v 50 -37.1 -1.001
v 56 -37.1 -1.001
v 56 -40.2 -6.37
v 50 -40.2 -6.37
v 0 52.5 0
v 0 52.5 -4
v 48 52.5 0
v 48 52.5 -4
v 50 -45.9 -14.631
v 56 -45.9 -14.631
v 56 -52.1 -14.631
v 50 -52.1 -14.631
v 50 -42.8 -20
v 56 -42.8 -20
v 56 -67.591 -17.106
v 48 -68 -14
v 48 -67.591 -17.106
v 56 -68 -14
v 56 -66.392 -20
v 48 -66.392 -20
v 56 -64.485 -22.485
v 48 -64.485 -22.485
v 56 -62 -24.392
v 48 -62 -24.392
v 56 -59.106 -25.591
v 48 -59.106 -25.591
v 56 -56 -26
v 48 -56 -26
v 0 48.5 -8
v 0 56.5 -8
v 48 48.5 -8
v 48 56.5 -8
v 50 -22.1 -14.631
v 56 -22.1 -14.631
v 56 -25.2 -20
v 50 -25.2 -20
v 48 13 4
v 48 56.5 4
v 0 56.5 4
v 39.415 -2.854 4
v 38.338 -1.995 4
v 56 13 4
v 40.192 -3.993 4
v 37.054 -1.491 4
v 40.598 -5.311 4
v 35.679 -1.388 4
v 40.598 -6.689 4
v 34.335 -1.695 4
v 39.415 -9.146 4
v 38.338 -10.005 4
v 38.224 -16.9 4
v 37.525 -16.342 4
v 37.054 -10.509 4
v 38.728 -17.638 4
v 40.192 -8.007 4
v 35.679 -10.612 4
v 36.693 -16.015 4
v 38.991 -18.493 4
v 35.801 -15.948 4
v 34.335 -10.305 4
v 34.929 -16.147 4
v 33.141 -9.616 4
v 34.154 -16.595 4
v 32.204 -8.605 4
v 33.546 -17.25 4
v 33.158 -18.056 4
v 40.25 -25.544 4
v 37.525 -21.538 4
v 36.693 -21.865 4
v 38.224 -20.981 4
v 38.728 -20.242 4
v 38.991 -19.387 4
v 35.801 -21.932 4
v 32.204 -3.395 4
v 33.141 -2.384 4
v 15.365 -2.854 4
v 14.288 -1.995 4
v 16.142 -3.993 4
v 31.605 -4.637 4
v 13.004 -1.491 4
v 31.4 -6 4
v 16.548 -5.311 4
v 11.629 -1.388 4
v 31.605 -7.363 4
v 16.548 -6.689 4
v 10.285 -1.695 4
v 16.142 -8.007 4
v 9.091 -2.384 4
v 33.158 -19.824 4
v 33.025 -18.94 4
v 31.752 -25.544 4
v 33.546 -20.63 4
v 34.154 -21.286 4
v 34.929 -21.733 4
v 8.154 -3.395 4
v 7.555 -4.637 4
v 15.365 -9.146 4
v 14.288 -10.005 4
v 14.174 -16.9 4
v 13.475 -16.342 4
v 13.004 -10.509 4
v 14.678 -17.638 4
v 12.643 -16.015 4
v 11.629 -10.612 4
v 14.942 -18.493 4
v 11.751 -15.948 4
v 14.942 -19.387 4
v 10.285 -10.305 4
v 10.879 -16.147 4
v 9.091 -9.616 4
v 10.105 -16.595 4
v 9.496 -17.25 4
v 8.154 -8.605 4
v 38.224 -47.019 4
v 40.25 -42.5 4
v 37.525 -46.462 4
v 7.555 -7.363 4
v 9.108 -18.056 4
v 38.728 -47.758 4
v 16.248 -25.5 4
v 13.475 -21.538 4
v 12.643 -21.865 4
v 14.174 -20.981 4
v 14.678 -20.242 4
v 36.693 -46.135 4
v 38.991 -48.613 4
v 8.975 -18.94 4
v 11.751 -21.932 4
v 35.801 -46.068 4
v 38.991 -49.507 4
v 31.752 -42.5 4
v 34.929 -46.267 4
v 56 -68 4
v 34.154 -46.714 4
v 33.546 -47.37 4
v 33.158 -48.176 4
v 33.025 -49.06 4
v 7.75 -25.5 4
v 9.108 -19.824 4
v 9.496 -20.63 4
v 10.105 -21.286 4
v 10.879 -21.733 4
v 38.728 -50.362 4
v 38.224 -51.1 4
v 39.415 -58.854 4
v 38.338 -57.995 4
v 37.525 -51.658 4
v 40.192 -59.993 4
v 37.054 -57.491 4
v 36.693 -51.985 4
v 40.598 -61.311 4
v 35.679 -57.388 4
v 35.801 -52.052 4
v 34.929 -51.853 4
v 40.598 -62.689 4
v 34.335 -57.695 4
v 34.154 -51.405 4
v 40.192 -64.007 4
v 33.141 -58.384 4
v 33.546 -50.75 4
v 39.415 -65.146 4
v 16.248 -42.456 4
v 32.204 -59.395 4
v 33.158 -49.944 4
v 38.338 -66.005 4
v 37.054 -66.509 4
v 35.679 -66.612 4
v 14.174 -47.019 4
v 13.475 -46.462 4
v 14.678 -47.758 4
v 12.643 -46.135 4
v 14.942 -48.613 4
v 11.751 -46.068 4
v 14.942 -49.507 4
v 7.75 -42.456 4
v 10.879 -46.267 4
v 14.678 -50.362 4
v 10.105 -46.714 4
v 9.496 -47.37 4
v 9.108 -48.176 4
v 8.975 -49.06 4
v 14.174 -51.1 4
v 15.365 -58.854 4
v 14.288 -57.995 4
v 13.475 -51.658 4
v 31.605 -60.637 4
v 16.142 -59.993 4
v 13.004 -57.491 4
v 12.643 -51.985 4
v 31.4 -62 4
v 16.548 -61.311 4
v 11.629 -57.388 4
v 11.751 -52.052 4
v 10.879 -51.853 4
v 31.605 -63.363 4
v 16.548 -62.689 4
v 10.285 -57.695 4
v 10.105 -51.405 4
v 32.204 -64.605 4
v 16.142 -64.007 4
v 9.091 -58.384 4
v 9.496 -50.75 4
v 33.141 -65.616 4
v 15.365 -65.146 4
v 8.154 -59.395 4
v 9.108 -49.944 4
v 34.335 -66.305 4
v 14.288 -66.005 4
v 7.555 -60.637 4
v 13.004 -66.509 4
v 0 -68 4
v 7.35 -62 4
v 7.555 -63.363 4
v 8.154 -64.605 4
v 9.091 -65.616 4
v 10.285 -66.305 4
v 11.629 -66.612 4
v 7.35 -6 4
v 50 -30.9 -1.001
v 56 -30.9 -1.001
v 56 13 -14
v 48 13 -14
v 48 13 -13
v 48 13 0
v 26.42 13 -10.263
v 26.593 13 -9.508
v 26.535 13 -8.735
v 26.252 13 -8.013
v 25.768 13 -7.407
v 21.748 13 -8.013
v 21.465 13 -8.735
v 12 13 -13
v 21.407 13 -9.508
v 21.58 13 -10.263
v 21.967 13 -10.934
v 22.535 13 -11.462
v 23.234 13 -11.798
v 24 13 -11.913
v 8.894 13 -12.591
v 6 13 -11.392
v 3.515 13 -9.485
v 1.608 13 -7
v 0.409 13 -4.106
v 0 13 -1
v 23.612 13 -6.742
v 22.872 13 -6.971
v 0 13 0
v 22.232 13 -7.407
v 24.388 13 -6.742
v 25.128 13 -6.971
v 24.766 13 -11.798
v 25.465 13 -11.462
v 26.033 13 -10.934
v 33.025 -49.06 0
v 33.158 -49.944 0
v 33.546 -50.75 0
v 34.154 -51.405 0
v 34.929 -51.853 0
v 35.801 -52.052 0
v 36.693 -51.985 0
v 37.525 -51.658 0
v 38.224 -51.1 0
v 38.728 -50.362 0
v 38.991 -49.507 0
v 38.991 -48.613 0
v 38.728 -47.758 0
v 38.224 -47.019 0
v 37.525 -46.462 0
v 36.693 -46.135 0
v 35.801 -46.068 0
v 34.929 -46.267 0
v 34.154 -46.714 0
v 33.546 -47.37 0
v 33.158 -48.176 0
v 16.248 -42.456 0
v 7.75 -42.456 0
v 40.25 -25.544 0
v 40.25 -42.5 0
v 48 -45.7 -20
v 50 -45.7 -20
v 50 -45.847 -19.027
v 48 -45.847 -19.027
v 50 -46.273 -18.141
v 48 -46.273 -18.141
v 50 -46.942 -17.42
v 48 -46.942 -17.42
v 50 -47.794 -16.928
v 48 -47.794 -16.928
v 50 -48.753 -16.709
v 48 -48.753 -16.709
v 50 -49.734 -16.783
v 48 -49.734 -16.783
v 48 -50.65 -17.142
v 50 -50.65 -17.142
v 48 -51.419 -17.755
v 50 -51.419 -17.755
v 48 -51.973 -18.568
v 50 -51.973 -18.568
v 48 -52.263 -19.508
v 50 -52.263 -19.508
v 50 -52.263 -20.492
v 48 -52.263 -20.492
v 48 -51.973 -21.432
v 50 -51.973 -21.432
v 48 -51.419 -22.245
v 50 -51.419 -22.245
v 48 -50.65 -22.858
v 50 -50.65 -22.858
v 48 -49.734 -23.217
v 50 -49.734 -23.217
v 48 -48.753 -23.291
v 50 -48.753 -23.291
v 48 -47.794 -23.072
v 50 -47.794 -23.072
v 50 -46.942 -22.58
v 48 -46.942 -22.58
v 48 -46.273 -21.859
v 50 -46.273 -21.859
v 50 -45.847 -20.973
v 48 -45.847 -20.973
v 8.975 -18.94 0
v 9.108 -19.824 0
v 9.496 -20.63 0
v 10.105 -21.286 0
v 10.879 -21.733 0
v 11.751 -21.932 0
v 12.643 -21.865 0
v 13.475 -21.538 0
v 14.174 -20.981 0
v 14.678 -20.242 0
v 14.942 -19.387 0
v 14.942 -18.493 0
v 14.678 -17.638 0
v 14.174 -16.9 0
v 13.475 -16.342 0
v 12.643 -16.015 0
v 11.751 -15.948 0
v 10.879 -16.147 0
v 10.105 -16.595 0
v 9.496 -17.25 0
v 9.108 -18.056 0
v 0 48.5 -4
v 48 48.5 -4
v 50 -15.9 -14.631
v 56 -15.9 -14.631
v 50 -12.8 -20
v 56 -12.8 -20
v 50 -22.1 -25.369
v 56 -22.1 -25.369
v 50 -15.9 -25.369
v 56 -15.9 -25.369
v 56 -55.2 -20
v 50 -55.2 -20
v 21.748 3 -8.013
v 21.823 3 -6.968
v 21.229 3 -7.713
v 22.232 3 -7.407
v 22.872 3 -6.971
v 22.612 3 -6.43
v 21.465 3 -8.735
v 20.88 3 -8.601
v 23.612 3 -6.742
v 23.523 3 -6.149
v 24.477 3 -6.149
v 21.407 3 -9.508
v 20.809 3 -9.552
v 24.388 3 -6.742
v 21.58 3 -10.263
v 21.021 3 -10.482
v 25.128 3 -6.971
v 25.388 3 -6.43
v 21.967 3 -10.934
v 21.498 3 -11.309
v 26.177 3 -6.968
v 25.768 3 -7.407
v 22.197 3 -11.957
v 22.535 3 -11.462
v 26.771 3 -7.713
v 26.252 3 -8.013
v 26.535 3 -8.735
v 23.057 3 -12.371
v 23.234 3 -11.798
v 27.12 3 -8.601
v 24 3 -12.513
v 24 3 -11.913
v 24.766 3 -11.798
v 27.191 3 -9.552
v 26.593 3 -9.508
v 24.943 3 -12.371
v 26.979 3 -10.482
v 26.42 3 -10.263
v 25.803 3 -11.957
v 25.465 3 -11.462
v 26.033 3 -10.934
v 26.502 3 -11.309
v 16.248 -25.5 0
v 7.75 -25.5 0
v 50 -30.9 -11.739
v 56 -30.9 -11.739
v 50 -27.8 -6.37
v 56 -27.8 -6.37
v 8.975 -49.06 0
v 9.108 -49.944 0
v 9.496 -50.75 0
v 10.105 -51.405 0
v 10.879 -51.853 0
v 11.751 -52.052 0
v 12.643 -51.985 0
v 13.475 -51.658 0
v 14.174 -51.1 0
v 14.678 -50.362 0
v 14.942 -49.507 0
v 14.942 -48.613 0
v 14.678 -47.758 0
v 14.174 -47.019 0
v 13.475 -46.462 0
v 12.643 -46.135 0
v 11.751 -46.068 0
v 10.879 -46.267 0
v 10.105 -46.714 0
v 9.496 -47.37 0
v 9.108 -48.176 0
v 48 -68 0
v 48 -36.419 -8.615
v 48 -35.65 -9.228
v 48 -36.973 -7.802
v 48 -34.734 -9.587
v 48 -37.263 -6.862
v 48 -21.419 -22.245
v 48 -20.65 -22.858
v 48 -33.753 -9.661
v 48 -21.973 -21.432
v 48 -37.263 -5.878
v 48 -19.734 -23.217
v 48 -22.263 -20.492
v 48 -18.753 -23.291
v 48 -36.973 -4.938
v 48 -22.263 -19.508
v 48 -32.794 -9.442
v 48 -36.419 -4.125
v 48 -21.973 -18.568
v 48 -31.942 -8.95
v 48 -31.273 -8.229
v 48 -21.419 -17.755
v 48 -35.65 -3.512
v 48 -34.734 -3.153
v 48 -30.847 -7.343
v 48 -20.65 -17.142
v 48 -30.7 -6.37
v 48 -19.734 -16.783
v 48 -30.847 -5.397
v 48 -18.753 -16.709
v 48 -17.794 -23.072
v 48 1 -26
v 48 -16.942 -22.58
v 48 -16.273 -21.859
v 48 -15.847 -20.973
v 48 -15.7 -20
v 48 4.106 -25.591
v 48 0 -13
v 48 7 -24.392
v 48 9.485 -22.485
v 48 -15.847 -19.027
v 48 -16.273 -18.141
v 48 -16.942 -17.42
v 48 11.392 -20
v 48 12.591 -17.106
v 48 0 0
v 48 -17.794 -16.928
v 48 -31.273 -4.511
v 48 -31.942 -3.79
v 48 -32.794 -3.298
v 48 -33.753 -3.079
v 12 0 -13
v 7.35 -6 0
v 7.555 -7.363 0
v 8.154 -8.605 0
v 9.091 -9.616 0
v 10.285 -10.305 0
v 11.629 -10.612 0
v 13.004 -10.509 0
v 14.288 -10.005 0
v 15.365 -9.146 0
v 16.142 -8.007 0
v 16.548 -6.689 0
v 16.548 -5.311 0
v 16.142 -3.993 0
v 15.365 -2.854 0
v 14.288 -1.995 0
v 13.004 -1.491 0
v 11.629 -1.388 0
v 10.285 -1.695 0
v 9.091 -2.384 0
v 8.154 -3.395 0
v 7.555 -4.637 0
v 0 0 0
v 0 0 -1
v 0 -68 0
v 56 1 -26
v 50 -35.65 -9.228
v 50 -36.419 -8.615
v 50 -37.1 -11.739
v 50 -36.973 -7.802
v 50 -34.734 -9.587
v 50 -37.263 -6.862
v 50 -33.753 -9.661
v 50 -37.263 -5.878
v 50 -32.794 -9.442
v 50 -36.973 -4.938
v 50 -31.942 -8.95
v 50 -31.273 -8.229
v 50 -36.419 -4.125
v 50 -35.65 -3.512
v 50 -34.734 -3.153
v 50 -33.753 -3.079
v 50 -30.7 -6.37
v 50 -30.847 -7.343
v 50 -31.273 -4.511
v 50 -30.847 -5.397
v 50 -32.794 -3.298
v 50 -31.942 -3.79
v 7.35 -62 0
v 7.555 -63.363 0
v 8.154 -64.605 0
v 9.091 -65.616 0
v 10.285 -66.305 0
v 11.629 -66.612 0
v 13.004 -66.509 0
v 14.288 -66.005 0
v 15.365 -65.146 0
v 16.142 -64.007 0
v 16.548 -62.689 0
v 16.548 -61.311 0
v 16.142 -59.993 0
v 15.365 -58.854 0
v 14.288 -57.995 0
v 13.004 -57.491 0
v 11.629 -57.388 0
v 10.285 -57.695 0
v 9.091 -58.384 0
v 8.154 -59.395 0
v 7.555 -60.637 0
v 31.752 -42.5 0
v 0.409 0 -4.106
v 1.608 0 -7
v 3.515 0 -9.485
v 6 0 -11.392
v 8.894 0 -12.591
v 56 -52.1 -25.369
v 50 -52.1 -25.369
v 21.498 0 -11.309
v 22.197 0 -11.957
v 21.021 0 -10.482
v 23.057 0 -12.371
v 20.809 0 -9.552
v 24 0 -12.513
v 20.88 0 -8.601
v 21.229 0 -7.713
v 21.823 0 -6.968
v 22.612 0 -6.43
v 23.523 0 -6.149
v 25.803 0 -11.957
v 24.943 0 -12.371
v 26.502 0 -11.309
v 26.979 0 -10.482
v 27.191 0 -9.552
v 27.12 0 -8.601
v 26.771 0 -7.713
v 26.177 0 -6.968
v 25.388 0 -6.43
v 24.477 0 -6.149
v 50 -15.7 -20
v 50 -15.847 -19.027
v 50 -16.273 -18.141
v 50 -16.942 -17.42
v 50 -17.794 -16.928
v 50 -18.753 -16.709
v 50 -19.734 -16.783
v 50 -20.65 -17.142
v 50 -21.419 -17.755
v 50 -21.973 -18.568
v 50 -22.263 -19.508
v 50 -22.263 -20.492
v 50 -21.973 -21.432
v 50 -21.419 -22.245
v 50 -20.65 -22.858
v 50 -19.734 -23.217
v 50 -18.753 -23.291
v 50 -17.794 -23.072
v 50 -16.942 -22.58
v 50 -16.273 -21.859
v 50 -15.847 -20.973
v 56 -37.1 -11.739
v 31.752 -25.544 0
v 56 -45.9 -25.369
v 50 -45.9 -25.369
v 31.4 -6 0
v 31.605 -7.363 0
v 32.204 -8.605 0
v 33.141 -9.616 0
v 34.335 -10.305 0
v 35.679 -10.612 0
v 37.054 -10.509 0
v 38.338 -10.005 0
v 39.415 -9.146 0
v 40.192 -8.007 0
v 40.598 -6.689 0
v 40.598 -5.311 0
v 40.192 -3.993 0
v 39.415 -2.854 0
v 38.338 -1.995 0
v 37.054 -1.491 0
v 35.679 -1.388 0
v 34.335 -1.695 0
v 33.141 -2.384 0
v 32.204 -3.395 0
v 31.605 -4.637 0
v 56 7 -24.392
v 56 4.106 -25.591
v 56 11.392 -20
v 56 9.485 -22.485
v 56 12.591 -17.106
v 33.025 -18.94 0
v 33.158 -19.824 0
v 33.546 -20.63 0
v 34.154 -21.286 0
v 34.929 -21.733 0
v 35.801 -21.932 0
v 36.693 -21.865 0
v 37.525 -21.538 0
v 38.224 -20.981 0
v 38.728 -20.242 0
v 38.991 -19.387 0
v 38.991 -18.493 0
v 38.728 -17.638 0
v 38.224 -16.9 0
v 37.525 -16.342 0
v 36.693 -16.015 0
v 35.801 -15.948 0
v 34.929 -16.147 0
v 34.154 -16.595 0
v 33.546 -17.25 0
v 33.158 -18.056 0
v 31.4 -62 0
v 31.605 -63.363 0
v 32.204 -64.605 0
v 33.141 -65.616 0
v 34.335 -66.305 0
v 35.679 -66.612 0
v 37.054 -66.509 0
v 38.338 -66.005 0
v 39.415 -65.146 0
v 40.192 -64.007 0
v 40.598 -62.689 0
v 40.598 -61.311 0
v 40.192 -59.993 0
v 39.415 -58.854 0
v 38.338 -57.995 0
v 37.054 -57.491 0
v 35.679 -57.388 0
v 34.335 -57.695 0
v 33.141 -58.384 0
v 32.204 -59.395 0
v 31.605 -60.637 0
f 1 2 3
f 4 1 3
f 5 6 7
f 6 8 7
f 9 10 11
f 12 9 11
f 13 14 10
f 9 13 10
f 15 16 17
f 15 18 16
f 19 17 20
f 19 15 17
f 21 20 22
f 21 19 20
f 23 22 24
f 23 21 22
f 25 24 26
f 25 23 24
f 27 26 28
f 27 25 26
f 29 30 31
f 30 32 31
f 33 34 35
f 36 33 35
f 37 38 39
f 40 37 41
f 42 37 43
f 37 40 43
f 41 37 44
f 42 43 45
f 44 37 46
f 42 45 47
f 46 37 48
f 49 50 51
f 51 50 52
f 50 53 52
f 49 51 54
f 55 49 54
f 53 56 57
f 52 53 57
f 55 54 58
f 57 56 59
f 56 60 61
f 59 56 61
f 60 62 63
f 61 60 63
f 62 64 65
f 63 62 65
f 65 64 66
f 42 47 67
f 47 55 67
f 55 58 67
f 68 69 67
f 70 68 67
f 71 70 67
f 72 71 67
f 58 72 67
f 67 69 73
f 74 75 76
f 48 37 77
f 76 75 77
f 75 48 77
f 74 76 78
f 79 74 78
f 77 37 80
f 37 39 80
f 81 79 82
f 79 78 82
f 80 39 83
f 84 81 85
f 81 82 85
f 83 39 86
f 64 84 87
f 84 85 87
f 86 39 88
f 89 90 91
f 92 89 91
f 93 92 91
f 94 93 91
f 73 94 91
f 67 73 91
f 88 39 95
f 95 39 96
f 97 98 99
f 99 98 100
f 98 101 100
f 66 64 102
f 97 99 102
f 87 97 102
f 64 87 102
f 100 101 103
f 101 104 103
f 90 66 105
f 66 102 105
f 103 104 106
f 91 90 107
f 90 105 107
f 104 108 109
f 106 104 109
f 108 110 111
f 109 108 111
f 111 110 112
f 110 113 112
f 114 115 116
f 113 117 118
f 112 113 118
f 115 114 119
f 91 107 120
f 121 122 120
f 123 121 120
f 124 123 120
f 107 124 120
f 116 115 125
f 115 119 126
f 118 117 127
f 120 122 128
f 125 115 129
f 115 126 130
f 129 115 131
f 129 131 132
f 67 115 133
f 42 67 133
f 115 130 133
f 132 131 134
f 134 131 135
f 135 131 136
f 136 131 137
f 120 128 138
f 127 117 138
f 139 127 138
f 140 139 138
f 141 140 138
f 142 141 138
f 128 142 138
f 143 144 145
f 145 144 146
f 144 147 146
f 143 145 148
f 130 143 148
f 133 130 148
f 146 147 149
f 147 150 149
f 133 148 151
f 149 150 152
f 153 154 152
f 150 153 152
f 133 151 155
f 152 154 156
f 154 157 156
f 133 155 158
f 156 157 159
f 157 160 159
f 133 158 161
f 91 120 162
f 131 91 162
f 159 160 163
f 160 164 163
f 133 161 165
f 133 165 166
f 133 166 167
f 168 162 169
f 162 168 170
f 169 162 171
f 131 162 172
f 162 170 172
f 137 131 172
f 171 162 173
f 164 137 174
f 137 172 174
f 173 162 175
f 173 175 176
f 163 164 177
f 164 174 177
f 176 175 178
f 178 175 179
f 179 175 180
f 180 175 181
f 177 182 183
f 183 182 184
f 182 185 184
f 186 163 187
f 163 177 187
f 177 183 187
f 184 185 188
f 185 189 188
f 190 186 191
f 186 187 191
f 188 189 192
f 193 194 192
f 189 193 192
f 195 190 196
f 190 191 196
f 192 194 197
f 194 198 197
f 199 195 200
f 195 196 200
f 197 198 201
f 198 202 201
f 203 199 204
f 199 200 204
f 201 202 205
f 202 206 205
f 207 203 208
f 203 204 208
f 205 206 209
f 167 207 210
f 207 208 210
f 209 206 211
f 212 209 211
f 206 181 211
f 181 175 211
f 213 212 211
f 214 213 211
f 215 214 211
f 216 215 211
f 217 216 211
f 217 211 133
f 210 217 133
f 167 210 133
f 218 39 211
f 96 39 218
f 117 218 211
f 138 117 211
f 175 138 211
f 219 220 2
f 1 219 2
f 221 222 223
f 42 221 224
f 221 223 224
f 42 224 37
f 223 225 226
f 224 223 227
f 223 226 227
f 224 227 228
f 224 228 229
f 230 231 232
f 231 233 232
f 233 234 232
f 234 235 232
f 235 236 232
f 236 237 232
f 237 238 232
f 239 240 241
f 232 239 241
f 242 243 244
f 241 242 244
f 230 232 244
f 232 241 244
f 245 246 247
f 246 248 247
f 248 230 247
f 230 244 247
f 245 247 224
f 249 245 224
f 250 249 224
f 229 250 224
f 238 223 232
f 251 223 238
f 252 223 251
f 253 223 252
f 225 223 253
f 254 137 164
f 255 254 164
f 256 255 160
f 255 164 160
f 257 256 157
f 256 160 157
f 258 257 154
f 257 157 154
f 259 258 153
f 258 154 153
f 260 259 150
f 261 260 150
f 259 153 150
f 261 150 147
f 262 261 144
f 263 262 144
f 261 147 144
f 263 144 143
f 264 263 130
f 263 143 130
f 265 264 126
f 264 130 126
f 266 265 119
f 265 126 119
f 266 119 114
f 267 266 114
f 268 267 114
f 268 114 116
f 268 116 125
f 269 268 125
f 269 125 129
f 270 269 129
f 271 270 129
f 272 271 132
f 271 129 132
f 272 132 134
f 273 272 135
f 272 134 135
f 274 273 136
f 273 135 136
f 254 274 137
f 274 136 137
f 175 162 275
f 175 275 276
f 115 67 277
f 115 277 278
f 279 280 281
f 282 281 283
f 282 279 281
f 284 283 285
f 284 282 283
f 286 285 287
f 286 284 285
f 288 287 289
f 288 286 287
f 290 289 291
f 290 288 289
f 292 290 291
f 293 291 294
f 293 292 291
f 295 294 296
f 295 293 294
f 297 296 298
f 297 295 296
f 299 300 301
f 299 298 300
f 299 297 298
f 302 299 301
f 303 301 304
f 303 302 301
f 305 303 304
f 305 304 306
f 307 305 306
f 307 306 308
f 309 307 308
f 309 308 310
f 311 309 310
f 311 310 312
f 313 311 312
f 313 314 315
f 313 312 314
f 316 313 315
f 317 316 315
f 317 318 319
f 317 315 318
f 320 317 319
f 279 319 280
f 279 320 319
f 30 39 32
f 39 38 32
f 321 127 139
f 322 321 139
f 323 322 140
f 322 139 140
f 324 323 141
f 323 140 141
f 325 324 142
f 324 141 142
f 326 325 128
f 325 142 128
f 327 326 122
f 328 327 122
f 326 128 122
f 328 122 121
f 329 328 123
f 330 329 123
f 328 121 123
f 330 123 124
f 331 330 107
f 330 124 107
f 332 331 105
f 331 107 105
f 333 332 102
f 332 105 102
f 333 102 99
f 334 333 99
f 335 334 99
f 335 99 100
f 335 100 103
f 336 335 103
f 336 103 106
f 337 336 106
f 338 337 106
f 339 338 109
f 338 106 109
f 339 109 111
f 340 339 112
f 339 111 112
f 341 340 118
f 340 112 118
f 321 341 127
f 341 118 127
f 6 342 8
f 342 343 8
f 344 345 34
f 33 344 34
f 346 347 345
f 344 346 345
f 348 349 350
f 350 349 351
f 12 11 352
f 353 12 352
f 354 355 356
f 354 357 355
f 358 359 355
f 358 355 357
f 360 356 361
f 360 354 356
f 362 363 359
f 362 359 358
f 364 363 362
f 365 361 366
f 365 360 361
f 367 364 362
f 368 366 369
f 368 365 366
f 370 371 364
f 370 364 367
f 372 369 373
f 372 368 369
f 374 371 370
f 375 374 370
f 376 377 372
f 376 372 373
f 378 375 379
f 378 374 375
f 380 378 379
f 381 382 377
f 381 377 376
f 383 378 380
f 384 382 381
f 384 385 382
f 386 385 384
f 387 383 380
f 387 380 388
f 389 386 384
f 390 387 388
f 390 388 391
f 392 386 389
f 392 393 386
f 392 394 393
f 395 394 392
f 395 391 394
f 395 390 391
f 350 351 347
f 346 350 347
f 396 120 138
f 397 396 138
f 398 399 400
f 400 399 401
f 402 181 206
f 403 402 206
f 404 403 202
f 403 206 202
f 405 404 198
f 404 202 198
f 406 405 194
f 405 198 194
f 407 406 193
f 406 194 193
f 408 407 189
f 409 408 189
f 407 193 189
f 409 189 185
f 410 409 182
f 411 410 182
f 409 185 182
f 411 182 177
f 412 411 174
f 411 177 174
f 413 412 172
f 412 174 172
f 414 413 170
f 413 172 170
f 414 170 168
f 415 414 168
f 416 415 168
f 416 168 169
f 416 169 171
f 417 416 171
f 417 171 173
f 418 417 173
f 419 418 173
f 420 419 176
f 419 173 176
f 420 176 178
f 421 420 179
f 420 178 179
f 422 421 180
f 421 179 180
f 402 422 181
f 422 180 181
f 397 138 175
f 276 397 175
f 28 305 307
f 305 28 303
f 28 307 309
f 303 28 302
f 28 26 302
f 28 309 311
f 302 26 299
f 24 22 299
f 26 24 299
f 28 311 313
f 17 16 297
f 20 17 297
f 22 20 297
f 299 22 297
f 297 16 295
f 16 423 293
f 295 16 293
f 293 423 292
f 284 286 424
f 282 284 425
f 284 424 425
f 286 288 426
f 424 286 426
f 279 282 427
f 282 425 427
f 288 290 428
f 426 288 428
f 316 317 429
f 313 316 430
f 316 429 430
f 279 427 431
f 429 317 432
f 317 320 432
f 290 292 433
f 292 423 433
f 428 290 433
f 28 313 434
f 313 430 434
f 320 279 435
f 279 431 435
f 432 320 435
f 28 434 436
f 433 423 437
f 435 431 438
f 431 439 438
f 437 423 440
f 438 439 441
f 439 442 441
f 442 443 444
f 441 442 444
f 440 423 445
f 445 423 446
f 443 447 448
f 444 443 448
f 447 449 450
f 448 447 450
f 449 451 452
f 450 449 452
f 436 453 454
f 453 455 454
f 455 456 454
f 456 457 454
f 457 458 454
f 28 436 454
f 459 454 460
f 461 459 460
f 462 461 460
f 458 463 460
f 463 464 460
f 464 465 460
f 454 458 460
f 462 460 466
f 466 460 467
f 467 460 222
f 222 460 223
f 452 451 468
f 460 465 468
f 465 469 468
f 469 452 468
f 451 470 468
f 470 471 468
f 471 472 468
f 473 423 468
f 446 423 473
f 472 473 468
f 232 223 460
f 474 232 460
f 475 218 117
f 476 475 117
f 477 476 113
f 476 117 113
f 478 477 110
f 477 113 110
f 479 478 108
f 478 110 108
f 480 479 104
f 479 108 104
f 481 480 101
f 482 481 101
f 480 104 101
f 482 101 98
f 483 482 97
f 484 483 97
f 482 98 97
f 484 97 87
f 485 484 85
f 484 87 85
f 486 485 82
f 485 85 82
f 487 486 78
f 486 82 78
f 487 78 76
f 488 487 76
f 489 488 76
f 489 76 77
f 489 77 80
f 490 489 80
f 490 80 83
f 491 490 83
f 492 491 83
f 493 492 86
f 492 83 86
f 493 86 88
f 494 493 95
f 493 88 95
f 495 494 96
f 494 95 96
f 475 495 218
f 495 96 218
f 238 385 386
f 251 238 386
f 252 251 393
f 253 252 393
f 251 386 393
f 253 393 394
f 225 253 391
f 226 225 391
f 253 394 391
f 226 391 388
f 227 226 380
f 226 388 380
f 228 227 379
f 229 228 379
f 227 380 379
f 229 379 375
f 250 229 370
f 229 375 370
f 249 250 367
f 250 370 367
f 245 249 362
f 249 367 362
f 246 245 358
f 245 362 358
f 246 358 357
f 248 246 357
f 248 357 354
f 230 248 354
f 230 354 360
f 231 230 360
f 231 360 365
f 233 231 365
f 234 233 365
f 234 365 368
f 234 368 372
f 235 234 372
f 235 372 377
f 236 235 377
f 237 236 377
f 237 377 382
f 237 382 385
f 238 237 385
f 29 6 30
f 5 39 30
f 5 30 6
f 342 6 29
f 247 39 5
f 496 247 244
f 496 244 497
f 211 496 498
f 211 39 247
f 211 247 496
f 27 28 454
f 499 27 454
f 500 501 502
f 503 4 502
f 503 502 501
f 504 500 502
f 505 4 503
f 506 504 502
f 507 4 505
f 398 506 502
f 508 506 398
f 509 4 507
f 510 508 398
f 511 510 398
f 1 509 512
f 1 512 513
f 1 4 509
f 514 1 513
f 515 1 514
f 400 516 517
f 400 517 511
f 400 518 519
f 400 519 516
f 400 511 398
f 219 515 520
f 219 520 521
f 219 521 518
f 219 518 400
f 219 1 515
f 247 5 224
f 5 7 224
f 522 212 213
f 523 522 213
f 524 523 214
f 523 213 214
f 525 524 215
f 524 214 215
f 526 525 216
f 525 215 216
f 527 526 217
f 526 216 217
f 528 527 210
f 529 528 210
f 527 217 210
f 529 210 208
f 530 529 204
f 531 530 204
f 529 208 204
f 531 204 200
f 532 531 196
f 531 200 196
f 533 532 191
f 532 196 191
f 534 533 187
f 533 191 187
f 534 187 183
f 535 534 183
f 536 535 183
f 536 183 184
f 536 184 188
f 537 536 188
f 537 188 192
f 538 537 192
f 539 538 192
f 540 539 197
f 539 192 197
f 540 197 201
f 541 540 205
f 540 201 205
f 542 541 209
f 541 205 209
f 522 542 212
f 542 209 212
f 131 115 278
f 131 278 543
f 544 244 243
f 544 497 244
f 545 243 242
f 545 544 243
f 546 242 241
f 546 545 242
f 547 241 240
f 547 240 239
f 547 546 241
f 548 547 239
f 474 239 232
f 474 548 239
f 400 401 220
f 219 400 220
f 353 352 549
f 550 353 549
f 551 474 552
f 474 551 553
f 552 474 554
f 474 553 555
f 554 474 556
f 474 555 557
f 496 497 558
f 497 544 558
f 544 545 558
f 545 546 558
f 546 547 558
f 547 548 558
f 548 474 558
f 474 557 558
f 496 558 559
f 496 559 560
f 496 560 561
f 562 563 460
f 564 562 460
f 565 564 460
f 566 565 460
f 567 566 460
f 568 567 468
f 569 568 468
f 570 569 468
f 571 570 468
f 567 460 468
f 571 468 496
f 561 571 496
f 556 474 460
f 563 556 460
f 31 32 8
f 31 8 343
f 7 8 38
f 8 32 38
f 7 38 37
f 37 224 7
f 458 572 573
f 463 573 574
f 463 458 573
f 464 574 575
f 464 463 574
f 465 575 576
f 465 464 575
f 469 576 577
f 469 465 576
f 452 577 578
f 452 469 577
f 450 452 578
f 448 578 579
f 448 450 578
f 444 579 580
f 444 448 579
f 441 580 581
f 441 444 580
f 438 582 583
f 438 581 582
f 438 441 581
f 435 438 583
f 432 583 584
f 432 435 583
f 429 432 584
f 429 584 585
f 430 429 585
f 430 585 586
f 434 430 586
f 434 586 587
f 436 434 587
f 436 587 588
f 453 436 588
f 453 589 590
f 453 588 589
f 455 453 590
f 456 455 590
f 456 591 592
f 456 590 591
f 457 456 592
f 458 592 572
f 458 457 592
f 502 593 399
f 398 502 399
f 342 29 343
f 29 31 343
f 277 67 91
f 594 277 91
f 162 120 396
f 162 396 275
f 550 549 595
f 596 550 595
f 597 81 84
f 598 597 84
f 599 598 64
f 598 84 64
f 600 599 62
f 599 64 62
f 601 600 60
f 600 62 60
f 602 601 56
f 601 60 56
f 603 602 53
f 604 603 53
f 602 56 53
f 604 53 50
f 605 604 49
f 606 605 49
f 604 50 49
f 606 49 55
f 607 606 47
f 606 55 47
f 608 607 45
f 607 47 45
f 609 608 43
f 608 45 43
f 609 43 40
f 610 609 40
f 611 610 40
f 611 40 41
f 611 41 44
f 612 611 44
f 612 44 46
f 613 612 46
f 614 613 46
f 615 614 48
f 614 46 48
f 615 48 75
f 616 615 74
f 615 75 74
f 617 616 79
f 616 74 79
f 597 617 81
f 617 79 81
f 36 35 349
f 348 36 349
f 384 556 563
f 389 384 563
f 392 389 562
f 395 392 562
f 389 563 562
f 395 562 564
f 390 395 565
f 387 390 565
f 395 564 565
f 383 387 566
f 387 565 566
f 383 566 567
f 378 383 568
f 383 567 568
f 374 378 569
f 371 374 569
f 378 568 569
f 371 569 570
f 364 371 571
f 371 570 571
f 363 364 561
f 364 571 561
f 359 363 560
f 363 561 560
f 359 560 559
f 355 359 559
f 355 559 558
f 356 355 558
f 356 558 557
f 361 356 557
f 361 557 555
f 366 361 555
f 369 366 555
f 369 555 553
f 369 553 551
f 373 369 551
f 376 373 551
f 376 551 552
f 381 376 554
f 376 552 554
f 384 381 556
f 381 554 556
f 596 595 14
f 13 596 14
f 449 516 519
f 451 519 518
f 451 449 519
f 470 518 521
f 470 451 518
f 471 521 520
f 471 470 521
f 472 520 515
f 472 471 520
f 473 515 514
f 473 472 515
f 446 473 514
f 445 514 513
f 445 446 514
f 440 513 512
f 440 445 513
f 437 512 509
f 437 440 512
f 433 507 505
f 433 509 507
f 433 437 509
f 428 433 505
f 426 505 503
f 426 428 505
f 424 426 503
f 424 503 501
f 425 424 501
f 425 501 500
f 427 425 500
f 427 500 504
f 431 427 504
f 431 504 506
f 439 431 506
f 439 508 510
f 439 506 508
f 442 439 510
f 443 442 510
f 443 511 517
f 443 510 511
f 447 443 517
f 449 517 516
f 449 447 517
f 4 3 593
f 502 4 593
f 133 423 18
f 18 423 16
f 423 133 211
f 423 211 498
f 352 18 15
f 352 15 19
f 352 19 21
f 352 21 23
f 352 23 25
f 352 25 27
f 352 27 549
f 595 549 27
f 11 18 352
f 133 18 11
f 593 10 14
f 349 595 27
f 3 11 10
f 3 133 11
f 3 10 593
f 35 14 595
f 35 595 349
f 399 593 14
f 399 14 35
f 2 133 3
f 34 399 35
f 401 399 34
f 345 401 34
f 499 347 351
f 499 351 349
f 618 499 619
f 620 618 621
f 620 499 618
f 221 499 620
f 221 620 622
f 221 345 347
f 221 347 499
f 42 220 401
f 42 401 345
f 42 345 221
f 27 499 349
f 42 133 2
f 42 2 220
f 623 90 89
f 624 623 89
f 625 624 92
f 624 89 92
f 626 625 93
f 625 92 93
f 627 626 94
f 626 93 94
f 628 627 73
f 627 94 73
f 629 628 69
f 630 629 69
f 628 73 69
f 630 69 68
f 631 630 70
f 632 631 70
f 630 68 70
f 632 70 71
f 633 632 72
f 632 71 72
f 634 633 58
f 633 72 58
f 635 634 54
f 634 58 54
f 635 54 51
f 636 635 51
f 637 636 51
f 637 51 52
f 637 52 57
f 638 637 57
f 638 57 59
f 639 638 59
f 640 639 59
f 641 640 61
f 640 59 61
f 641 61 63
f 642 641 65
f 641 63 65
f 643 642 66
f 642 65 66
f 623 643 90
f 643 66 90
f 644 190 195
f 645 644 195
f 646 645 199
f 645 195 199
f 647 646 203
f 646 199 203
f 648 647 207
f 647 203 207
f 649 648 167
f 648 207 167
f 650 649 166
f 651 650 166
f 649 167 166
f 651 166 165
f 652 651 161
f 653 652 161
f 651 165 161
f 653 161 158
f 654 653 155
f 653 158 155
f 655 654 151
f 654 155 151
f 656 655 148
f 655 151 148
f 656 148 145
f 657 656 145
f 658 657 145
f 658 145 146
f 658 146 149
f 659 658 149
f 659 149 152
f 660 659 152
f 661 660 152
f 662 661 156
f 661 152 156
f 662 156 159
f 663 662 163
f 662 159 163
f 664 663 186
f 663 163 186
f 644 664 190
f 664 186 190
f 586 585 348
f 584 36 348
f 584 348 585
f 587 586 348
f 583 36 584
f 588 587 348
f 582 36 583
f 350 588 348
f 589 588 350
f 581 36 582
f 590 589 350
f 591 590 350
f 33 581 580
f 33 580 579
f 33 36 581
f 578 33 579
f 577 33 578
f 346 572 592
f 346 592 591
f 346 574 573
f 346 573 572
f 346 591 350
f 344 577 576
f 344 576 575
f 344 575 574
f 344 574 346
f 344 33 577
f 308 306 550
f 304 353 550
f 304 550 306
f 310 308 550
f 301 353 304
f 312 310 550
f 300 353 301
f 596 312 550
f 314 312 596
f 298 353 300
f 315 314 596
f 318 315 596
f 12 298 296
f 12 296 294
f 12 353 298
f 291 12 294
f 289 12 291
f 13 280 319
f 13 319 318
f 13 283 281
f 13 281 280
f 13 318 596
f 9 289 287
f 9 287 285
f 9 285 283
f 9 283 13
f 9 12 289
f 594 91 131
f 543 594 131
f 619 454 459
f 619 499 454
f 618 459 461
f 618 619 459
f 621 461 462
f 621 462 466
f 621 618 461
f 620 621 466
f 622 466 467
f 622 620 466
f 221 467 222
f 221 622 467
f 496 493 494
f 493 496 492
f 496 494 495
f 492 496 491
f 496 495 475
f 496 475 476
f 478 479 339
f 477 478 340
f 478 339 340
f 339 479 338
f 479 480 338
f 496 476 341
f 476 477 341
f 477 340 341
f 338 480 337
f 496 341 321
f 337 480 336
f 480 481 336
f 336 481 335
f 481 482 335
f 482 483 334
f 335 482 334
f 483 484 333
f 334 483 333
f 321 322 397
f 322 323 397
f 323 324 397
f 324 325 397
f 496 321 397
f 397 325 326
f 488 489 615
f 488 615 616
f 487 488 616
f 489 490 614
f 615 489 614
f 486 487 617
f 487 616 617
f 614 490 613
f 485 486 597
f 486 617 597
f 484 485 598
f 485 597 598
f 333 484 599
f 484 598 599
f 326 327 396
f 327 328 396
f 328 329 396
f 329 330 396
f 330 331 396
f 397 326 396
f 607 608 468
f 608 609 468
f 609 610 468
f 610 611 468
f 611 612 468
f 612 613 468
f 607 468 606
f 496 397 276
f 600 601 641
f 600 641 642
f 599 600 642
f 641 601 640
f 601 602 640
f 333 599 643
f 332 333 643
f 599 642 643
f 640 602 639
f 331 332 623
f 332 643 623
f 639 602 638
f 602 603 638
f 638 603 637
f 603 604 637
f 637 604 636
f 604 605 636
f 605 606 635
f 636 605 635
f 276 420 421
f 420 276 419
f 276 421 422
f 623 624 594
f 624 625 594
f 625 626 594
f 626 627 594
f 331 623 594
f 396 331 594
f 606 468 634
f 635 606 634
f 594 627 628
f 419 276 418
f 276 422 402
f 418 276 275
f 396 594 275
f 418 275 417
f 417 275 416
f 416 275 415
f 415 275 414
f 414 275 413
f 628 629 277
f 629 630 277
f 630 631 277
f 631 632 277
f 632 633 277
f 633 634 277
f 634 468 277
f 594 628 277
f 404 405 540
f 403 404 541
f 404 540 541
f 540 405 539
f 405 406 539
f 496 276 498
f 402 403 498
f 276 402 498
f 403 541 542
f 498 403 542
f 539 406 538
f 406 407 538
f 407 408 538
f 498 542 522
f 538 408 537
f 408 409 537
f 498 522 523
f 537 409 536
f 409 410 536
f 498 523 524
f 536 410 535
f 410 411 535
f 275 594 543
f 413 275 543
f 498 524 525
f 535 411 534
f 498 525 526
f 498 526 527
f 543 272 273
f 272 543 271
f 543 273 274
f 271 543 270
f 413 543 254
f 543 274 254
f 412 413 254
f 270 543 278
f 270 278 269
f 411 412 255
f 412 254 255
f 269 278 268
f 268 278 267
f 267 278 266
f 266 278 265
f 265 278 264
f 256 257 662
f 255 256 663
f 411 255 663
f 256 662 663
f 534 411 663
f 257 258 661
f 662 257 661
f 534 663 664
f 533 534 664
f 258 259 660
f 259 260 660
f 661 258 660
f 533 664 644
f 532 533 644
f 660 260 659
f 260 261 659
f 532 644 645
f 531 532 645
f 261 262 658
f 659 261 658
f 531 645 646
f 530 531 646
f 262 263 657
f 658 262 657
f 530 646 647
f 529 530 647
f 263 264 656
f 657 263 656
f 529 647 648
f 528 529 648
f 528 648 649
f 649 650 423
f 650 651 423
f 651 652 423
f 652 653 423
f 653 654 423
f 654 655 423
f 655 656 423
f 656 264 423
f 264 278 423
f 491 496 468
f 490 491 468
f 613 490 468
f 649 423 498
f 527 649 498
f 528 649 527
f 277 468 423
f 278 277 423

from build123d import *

# Parameters (mm, degrees)
PAD_DEPTH       = 24
SKETCH_R        = 4.625
SKETCH_R_2      = 3
SKETCH_W        = 8.497862
SKETCH_H        = 16.9564
POCKET_DEPTH    = 4
SKETCH003_R     = 2.6
POCKET001_DEPTH = 13
SKETCH005_R     = 3.3
PAD001_DEPTH    = 8
SKETCH004_R     = 3.2
POCKET002_DEPTH = 3
POCKET003_DEPTH = 6
FILLET_R        = 12


with BuildPart() as part:
    # Sketch002 → Pad (new body, symmetric)
    with BuildSketch(Plane.YZ.offset(24)):
        Polygon((0, 4), (56.5, 4), (56.5, -8), (48.5, -8), (48.5, -4), (52.5, -4), (52.5, 0), (13, 0), (13, -13), (0, -13), (0, 0), (-68, 0), (-68, 4), align=None)
    extrude(amount=PAD_DEPTH, both=True)

    # Sketch (on Face13 of Pad) → Pocket (cut)
    with BuildSketch(Plane(origin=(24, -34, 4), x_dir=(-1, 0, 0), z_dir=(0, 0, 1))):
        with Locations((-12.025, 28)):
            Circle(SKETCH_R)
        with Locations((12.025, 28)):
            Circle(SKETCH_R)
        with Locations((12.025, -28)):
            Circle(SKETCH_R)
        with Locations((-12.025, -28)):
            Circle(SKETCH_R)
        with Locations((-12.024955, 15.059916)):
            Circle(SKETCH_R_2)
        with Locations((12.024955, 15.059916)):
            Circle(SKETCH_R_2)
        with Locations((12.024955, -15.059916)):
            Circle(SKETCH_R_2)
        with Locations((-12.024955, -15.059916)):
            Circle(SKETCH_R_2)
        with Locations((-12.001069, 0.0218)):
            Rectangle(SKETCH_W, SKETCH_H)
        with Locations((12.001069, -0.0218)):
            Rectangle(SKETCH_W, SKETCH_H)
    extrude(amount=-POCKET_DEPTH, mode=Mode.SUBTRACT)

    # Sketch003 (on Face30 of Pocket) → Pocket001 (cut)
    with BuildSketch(Plane(origin=(24, 0, 0), x_dir=(0, 0, -1), z_dir=(0, -1, 0))):
        with Locations((9.313336, 0)):
            Circle(SKETCH003_R)
    extrude(amount=-POCKET001_DEPTH, mode=Mode.SUBTRACT)

    # Sketch005 → Pad001 (join)
    with BuildSketch(Plane.YZ.offset(48)):
        Polygon((0, 4), (-68, 4), (-68, -26), (0, -26), (13, -26), (13, 4), align=None)
        with Locations((-49, -20)):
            Circle(SKETCH005_R, mode=Mode.SUBTRACT)
        with Locations((-19, -20)):
            Circle(SKETCH005_R, mode=Mode.SUBTRACT)
        with Locations((-34, -6.37)):
            Circle(SKETCH005_R, mode=Mode.SUBTRACT)
    extrude(amount=PAD001_DEPTH)

    # Sketch004 → Pocket002 (cut)
    with BuildSketch(Plane(origin=(24, 0, 0), x_dir=(0, 0, -1), z_dir=(0, -1, 0))):
        with Locations((9.313336, 0)):
            Circle(SKETCH004_R)
    extrude(amount=-POCKET002_DEPTH, mode=Mode.SUBTRACT)

    # Sketch006 (on Face35 of Pocket002) → Pocket003 (cut)
    with BuildSketch(Plane.YZ.offset(56)):
        Polygon((-42.8, -20), (-45.9, -14.630642), (-52.1, -14.630642), (-55.2, -20), (-52.1, -25.369358), (-45.9, -25.369358), align=None)
        Polygon((-27.8, -6.37), (-30.9, -1.000642), (-37.1, -1.000642), (-40.2, -6.37), (-37.1, -11.739358), (-30.9, -11.739358), align=None)
        Polygon((-12.8, -20), (-15.9, -14.630642), (-22.1, -14.630642), (-25.2, -20), (-22.1, -25.369358), (-15.9, -25.369358), align=None)
    extrude(amount=-POCKET003_DEPTH, mode=Mode.SUBTRACT)

    # Fillet
    fillet_edges = [part.edges().sort_by_distance(p)[0] for p in [
        (52, -68, -26),
        (52, 13, -26),
        (0, 6.5, -13),
    ]]
    fillet(fillet_edges, radius=FILLET_R)


solid = part.part
